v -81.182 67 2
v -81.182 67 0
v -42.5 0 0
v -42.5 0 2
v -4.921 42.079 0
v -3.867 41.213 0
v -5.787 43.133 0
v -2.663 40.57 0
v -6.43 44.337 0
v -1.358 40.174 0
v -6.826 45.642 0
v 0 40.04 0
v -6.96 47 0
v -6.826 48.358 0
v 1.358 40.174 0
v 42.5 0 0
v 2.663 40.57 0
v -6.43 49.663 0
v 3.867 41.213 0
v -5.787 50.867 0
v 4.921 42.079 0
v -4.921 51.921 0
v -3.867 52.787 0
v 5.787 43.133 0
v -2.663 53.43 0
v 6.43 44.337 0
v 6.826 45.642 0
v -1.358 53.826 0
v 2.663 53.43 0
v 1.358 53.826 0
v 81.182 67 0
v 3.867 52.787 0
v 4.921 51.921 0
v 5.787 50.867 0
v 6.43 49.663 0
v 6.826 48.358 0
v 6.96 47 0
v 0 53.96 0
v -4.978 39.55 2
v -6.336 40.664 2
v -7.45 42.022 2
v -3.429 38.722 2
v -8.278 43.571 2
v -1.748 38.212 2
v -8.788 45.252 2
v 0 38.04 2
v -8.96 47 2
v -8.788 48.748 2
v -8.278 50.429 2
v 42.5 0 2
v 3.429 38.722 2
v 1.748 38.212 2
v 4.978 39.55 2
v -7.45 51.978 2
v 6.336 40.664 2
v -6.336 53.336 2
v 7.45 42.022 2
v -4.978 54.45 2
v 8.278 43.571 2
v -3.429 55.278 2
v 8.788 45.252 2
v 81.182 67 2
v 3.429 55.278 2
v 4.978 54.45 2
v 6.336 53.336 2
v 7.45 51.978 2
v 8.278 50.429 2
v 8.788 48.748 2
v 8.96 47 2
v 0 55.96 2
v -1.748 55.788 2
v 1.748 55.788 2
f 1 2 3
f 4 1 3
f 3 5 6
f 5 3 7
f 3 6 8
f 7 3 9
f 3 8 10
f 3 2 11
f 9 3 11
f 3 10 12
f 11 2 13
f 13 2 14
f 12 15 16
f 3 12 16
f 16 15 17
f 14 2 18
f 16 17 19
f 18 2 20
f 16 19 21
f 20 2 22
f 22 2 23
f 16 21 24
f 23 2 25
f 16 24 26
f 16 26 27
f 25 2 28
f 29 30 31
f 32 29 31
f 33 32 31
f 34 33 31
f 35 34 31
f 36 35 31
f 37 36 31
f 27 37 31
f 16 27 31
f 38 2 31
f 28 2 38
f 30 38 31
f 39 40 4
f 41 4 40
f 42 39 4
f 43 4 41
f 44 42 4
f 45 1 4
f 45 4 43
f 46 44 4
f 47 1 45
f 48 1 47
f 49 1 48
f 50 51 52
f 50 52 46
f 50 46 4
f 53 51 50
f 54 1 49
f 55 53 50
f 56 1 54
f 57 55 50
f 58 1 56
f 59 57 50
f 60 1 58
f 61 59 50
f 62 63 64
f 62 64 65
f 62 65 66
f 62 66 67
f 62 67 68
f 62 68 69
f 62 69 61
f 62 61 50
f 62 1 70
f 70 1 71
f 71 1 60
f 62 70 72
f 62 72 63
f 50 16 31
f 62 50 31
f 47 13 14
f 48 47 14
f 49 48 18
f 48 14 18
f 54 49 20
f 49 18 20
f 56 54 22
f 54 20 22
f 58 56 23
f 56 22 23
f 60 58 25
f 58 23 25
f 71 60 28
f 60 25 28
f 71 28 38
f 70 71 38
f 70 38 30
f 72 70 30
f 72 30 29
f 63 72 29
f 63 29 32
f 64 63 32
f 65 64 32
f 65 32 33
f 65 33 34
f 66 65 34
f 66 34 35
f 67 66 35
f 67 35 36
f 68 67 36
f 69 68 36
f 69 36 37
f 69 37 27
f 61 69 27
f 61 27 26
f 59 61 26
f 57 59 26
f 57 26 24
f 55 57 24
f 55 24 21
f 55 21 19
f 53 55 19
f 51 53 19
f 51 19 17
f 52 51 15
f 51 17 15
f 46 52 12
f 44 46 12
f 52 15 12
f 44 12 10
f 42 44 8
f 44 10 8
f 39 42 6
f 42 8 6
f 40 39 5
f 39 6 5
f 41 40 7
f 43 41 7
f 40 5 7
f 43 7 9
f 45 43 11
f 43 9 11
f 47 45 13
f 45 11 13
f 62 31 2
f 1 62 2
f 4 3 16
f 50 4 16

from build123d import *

# Parameters (mm, degrees)
F1_DEPTH       = 2
F3_D           = 8.8
F3_CSINK_D     = 17.92
F3_CSINK_ANGLE = 90


with BuildPart() as f1:
    # F0 (on Top) → F1 (new body)
    with BuildSketch(Plane.XY):
        Polygon((-81.1824680357, 67), (-42.5, 0), (42.5, 0), (81.1824680357, 67), align=None)
    extrude(amount=F1_DEPTH)

    # F3 (through all)
    with Locations(Plane.XY.offset(2)):
        with Locations((0, 47)):
            CounterSinkHole(F3_D / 2, F3_CSINK_D / 2, counter_sink_angle=F3_CSINK_ANGLE)


solid = f1.part
